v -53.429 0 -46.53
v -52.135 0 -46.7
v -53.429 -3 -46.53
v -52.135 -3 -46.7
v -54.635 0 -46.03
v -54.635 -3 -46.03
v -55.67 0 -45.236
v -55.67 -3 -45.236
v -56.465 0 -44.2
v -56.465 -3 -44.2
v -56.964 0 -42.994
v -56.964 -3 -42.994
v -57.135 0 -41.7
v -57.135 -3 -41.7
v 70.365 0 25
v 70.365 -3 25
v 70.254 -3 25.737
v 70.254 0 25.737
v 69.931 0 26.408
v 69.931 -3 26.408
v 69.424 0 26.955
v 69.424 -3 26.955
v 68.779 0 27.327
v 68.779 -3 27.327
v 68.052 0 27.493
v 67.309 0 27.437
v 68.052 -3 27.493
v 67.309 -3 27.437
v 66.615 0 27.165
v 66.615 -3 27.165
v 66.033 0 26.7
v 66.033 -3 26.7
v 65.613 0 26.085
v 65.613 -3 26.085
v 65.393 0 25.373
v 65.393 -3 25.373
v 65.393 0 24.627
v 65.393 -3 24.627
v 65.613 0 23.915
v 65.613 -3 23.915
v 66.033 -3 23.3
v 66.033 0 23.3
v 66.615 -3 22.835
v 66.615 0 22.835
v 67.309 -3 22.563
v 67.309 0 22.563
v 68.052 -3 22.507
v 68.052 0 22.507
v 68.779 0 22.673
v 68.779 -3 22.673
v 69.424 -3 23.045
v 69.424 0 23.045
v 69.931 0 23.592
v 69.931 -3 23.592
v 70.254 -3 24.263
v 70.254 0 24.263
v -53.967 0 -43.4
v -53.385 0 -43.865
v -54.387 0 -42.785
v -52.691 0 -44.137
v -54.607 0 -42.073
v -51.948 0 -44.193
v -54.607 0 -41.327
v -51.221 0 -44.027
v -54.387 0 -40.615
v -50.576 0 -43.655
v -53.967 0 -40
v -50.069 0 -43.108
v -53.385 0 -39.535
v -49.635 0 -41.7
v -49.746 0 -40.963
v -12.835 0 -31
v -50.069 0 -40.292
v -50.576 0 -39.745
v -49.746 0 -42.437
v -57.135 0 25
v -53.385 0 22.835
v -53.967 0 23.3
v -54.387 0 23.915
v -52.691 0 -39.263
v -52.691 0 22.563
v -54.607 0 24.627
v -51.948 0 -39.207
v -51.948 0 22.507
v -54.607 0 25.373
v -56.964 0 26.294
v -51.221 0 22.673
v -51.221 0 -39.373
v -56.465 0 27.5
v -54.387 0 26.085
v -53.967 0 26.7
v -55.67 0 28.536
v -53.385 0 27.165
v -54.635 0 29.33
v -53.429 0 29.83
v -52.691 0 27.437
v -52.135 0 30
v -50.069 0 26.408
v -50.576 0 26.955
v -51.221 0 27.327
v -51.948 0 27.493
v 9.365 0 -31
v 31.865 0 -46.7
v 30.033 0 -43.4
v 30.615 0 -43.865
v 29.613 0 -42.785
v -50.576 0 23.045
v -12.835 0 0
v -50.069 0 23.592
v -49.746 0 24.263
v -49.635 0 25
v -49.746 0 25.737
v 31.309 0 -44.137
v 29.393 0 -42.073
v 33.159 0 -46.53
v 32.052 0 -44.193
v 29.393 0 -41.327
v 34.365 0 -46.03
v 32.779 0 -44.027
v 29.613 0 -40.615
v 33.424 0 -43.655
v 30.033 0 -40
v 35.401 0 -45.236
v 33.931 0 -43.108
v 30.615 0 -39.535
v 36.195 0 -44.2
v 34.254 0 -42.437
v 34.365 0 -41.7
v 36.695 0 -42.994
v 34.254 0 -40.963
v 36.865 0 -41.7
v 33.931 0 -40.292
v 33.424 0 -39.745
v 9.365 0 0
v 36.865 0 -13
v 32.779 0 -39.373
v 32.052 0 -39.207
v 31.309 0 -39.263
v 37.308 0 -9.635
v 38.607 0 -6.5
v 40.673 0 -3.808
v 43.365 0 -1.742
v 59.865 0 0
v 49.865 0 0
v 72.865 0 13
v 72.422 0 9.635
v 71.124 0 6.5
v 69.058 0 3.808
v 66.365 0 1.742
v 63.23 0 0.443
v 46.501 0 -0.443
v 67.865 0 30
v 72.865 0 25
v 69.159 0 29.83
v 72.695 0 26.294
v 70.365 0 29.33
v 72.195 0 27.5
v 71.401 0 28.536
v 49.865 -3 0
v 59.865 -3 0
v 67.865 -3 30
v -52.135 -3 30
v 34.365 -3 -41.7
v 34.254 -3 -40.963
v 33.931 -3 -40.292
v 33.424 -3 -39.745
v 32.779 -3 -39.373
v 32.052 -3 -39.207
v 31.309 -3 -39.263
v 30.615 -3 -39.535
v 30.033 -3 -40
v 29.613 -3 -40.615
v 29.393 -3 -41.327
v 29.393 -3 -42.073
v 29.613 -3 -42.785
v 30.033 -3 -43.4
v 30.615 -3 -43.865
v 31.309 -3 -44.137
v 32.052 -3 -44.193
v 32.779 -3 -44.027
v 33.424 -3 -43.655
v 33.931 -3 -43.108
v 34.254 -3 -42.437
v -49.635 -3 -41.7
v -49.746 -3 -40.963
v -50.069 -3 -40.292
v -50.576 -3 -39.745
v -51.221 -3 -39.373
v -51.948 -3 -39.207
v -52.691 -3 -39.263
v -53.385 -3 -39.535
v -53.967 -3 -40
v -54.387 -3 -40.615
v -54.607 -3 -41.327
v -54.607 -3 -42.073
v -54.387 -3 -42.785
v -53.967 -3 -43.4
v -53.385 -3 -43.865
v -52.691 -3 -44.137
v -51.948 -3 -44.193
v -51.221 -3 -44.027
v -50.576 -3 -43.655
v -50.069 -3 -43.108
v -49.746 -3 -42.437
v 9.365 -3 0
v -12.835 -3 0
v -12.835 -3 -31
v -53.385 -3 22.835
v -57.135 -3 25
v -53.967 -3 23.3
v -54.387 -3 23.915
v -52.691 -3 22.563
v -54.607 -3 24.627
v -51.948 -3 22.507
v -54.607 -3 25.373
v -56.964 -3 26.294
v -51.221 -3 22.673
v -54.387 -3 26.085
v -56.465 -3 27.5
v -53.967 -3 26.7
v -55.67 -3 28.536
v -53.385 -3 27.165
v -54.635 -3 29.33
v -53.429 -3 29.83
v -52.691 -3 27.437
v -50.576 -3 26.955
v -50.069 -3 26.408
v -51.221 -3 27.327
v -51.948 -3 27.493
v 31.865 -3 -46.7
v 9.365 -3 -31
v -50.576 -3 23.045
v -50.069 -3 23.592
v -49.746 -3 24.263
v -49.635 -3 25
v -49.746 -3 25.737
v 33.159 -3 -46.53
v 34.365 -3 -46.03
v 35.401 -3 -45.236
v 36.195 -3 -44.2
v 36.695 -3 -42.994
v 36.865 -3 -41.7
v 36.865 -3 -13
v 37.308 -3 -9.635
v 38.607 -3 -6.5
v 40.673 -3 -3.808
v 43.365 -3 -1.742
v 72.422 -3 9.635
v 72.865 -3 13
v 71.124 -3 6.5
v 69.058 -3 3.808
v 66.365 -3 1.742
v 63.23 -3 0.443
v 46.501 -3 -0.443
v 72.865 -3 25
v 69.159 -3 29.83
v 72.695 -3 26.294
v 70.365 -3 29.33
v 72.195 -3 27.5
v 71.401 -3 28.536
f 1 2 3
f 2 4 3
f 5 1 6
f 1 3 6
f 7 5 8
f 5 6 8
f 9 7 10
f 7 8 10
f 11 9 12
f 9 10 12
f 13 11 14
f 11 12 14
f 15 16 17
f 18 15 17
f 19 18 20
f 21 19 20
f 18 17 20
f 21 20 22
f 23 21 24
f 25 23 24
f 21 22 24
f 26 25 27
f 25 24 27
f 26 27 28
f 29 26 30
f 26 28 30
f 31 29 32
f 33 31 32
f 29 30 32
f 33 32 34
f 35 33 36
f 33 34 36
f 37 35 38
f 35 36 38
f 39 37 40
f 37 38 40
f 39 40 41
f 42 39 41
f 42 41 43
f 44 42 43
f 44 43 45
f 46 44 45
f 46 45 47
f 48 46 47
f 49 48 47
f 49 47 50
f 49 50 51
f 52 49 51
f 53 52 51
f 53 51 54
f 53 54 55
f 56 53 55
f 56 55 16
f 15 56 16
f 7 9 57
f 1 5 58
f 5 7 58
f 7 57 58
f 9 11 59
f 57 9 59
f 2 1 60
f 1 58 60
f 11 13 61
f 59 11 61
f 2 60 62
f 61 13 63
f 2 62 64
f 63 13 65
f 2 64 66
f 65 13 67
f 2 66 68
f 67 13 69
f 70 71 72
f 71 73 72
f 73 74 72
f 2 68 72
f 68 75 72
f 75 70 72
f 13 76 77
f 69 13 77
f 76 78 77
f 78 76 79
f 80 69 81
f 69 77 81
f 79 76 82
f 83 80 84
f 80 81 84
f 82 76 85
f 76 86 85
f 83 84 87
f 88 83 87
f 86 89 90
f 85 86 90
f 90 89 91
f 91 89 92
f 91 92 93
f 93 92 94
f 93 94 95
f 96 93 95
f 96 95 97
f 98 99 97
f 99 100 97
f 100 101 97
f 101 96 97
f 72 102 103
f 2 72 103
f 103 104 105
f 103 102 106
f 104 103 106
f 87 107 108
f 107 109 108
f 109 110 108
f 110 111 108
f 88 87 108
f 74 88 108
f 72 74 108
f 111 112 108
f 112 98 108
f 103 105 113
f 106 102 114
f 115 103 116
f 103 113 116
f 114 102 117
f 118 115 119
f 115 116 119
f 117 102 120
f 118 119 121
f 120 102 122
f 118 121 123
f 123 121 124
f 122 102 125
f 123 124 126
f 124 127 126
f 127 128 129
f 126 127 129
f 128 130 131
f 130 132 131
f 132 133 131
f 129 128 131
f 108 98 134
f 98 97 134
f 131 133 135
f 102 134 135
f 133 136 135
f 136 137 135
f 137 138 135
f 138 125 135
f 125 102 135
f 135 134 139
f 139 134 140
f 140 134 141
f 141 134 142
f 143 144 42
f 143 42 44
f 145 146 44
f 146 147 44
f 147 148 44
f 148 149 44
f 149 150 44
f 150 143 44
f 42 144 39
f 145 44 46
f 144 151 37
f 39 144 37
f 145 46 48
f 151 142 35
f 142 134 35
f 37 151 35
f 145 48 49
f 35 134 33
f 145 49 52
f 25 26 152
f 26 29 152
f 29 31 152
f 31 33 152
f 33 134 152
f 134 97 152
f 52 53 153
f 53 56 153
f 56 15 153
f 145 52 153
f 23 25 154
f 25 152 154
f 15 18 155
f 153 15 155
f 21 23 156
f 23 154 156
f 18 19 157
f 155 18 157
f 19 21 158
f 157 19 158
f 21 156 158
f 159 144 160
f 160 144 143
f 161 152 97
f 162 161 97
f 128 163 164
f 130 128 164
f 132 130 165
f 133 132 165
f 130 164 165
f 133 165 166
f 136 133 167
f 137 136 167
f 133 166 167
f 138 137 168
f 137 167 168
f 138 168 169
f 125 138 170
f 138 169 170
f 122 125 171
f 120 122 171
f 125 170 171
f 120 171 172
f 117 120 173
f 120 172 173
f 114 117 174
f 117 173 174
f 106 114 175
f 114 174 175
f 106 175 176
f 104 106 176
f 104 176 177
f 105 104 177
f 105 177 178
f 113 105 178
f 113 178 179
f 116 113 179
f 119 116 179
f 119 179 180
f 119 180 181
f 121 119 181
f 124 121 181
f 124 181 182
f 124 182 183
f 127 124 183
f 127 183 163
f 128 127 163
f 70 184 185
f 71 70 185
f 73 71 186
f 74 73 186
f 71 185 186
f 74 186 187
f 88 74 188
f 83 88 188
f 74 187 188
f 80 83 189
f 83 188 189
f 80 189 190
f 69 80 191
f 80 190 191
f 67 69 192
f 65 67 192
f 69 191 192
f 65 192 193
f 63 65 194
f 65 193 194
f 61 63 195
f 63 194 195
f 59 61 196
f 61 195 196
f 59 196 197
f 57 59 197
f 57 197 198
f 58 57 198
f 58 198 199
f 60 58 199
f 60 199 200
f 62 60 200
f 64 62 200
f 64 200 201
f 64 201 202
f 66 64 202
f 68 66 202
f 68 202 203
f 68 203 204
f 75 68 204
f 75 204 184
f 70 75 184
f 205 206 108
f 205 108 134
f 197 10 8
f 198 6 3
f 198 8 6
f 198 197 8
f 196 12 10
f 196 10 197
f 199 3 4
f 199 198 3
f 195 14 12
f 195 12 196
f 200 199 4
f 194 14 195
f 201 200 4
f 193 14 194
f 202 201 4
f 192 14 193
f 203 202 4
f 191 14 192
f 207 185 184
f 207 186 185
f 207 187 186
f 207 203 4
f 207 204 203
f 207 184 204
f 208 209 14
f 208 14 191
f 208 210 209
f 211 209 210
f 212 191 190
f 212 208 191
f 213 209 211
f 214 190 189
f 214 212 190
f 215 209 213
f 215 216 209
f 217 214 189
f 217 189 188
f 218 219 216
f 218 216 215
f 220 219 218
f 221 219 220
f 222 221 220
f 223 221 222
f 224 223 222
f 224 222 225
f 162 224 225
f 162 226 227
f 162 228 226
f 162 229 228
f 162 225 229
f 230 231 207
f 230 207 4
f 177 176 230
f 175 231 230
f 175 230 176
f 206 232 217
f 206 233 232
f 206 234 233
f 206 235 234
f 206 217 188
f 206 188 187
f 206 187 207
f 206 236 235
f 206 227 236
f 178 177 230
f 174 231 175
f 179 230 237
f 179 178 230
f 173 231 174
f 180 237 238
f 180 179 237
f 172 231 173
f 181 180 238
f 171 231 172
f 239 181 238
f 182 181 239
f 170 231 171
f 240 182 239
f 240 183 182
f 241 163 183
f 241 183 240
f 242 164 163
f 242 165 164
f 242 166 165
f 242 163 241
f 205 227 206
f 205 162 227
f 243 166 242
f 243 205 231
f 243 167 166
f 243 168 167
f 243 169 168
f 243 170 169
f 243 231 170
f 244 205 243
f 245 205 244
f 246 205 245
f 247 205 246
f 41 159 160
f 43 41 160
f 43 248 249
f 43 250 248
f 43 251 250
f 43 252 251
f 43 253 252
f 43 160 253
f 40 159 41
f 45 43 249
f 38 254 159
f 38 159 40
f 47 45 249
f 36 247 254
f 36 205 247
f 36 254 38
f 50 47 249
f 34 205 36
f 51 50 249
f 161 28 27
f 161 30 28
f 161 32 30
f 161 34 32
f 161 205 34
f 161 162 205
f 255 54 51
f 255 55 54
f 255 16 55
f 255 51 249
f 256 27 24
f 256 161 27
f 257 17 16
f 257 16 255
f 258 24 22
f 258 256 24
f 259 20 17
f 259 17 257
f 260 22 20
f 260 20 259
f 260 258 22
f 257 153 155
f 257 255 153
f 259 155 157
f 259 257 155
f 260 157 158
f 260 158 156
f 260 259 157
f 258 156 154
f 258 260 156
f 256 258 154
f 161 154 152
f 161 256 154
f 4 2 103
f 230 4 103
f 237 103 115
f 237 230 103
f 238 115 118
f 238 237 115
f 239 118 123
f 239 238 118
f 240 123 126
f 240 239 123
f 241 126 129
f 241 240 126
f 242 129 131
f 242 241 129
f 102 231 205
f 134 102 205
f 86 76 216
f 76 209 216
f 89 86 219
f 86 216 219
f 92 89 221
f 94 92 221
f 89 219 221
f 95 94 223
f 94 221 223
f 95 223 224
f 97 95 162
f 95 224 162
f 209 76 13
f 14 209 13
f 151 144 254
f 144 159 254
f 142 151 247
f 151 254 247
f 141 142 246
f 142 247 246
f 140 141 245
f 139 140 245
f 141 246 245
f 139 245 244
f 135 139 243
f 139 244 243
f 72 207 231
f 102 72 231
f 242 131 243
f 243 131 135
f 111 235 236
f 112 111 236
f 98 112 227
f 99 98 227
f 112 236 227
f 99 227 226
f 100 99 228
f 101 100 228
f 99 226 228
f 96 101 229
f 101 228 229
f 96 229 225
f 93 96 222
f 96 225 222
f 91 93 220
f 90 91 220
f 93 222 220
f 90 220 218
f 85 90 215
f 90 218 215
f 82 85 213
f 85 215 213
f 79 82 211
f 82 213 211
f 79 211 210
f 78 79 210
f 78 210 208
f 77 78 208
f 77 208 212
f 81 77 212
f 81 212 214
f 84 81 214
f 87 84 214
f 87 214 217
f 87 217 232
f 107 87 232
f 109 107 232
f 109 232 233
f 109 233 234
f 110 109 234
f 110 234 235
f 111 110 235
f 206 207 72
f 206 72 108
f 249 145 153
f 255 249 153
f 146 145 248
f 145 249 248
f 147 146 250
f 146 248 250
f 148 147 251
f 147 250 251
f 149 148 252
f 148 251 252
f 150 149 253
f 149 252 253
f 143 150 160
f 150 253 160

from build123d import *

# Parameters (mm, degrees)
F1_DEPTH  = 3
F2_W      = 22.2
F2_H      = 31
F3_DEPTH  = 25
F4_R      = 13
F5_R      = 13
F6_R      = 5
F7_R      = 5
F8_R      = 5
F9_R      = 5
F10_R     = 2.5
F11_DEPTH = 25
F12_R     = 2.5
F13_DEPTH = 25
F14_R     = 2.5
F15_DEPTH = 25
F16_R     = 2.5
F17_DEPTH = 25


with BuildPart() as f1:
    # F0 (on Front) → F1 (new body)
    with BuildSketch(Plane.XZ):
        Polygon((72.865328, 30), (-57.134672, 30), (-57.134672, -46.7), (36.865328, -46.7), (36.865328, 0), (72.865328, 0), align=None)
    extrude(amount=F1_DEPTH)

    # F2 (on face) → F3 (cut)
    with BuildSketch(Plane.XZ.offset(3)):
        with Locations((-1.734672, -15.5)):
            Rectangle(F2_W, F2_H)
    extrude(amount=-F3_DEPTH, mode=Mode.SUBTRACT)

    # F4
    f4_edges = [f1.edges().sort_by_distance(p)[0] for p in [
        (72.865328, -1.5, 0),
    ]]
    fillet(f4_edges, radius=F4_R)

    # F5
    f5_edges = [f1.edges().sort_by_distance(p)[0] for p in [
        (36.865328, -1.5, 0),
    ]]
    fillet(f5_edges, radius=F5_R)

    # F6
    f6_edges = [f1.edges().sort_by_distance(p)[0] for p in [
        (72.865328, -1.5, 30),
    ]]
    fillet(f6_edges, radius=F6_R)

    # F7
    f7_edges = [f1.edges().sort_by_distance(p)[0] for p in [
        (36.865328, -1.5, -46.7),
    ]]
    fillet(f7_edges, radius=F7_R)

    # F8
    f8_edges = [f1.edges().sort_by_distance(p)[0] for p in [
        (-57.134672, -1.5, -46.7),
    ]]
    fillet(f8_edges, radius=F8_R)

    # F9
    f9_edges = [f1.edges().sort_by_distance(p)[0] for p in [
        (-57.134672, -1.5, 30),
    ]]
    fillet(f9_edges, radius=F9_R)

    # F10 (on face) → F11 (cut)
    with BuildSketch(Plane.XZ.offset(3)):
        with Locations((-52.134672, 25)):
            Circle(F10_R)
    extrude(amount=-F11_DEPTH, mode=Mode.SUBTRACT)

    # F12 (on face) → F13 (cut)
    with BuildSketch(Plane.XZ.offset(3)):
        with Locations((67.865328, 25)):
            Circle(F12_R)
    extrude(amount=-F13_DEPTH, mode=Mode.SUBTRACT)

    # F14 (on face) → F15 (cut)
    with BuildSketch(Plane.XZ.offset(3)):
        with Locations((-52.134672, -41.7)):
            Circle(F14_R)
    extrude(amount=-F15_DEPTH, mode=Mode.SUBTRACT)

    # F16 (on face) → F17 (cut)
    with BuildSketch(Plane.XZ.offset(3)):
        with Locations((31.865328, -41.7)):
            Circle(F16_R)
    extrude(amount=-F17_DEPTH, mode=Mode.SUBTRACT)


solid = f1.part
